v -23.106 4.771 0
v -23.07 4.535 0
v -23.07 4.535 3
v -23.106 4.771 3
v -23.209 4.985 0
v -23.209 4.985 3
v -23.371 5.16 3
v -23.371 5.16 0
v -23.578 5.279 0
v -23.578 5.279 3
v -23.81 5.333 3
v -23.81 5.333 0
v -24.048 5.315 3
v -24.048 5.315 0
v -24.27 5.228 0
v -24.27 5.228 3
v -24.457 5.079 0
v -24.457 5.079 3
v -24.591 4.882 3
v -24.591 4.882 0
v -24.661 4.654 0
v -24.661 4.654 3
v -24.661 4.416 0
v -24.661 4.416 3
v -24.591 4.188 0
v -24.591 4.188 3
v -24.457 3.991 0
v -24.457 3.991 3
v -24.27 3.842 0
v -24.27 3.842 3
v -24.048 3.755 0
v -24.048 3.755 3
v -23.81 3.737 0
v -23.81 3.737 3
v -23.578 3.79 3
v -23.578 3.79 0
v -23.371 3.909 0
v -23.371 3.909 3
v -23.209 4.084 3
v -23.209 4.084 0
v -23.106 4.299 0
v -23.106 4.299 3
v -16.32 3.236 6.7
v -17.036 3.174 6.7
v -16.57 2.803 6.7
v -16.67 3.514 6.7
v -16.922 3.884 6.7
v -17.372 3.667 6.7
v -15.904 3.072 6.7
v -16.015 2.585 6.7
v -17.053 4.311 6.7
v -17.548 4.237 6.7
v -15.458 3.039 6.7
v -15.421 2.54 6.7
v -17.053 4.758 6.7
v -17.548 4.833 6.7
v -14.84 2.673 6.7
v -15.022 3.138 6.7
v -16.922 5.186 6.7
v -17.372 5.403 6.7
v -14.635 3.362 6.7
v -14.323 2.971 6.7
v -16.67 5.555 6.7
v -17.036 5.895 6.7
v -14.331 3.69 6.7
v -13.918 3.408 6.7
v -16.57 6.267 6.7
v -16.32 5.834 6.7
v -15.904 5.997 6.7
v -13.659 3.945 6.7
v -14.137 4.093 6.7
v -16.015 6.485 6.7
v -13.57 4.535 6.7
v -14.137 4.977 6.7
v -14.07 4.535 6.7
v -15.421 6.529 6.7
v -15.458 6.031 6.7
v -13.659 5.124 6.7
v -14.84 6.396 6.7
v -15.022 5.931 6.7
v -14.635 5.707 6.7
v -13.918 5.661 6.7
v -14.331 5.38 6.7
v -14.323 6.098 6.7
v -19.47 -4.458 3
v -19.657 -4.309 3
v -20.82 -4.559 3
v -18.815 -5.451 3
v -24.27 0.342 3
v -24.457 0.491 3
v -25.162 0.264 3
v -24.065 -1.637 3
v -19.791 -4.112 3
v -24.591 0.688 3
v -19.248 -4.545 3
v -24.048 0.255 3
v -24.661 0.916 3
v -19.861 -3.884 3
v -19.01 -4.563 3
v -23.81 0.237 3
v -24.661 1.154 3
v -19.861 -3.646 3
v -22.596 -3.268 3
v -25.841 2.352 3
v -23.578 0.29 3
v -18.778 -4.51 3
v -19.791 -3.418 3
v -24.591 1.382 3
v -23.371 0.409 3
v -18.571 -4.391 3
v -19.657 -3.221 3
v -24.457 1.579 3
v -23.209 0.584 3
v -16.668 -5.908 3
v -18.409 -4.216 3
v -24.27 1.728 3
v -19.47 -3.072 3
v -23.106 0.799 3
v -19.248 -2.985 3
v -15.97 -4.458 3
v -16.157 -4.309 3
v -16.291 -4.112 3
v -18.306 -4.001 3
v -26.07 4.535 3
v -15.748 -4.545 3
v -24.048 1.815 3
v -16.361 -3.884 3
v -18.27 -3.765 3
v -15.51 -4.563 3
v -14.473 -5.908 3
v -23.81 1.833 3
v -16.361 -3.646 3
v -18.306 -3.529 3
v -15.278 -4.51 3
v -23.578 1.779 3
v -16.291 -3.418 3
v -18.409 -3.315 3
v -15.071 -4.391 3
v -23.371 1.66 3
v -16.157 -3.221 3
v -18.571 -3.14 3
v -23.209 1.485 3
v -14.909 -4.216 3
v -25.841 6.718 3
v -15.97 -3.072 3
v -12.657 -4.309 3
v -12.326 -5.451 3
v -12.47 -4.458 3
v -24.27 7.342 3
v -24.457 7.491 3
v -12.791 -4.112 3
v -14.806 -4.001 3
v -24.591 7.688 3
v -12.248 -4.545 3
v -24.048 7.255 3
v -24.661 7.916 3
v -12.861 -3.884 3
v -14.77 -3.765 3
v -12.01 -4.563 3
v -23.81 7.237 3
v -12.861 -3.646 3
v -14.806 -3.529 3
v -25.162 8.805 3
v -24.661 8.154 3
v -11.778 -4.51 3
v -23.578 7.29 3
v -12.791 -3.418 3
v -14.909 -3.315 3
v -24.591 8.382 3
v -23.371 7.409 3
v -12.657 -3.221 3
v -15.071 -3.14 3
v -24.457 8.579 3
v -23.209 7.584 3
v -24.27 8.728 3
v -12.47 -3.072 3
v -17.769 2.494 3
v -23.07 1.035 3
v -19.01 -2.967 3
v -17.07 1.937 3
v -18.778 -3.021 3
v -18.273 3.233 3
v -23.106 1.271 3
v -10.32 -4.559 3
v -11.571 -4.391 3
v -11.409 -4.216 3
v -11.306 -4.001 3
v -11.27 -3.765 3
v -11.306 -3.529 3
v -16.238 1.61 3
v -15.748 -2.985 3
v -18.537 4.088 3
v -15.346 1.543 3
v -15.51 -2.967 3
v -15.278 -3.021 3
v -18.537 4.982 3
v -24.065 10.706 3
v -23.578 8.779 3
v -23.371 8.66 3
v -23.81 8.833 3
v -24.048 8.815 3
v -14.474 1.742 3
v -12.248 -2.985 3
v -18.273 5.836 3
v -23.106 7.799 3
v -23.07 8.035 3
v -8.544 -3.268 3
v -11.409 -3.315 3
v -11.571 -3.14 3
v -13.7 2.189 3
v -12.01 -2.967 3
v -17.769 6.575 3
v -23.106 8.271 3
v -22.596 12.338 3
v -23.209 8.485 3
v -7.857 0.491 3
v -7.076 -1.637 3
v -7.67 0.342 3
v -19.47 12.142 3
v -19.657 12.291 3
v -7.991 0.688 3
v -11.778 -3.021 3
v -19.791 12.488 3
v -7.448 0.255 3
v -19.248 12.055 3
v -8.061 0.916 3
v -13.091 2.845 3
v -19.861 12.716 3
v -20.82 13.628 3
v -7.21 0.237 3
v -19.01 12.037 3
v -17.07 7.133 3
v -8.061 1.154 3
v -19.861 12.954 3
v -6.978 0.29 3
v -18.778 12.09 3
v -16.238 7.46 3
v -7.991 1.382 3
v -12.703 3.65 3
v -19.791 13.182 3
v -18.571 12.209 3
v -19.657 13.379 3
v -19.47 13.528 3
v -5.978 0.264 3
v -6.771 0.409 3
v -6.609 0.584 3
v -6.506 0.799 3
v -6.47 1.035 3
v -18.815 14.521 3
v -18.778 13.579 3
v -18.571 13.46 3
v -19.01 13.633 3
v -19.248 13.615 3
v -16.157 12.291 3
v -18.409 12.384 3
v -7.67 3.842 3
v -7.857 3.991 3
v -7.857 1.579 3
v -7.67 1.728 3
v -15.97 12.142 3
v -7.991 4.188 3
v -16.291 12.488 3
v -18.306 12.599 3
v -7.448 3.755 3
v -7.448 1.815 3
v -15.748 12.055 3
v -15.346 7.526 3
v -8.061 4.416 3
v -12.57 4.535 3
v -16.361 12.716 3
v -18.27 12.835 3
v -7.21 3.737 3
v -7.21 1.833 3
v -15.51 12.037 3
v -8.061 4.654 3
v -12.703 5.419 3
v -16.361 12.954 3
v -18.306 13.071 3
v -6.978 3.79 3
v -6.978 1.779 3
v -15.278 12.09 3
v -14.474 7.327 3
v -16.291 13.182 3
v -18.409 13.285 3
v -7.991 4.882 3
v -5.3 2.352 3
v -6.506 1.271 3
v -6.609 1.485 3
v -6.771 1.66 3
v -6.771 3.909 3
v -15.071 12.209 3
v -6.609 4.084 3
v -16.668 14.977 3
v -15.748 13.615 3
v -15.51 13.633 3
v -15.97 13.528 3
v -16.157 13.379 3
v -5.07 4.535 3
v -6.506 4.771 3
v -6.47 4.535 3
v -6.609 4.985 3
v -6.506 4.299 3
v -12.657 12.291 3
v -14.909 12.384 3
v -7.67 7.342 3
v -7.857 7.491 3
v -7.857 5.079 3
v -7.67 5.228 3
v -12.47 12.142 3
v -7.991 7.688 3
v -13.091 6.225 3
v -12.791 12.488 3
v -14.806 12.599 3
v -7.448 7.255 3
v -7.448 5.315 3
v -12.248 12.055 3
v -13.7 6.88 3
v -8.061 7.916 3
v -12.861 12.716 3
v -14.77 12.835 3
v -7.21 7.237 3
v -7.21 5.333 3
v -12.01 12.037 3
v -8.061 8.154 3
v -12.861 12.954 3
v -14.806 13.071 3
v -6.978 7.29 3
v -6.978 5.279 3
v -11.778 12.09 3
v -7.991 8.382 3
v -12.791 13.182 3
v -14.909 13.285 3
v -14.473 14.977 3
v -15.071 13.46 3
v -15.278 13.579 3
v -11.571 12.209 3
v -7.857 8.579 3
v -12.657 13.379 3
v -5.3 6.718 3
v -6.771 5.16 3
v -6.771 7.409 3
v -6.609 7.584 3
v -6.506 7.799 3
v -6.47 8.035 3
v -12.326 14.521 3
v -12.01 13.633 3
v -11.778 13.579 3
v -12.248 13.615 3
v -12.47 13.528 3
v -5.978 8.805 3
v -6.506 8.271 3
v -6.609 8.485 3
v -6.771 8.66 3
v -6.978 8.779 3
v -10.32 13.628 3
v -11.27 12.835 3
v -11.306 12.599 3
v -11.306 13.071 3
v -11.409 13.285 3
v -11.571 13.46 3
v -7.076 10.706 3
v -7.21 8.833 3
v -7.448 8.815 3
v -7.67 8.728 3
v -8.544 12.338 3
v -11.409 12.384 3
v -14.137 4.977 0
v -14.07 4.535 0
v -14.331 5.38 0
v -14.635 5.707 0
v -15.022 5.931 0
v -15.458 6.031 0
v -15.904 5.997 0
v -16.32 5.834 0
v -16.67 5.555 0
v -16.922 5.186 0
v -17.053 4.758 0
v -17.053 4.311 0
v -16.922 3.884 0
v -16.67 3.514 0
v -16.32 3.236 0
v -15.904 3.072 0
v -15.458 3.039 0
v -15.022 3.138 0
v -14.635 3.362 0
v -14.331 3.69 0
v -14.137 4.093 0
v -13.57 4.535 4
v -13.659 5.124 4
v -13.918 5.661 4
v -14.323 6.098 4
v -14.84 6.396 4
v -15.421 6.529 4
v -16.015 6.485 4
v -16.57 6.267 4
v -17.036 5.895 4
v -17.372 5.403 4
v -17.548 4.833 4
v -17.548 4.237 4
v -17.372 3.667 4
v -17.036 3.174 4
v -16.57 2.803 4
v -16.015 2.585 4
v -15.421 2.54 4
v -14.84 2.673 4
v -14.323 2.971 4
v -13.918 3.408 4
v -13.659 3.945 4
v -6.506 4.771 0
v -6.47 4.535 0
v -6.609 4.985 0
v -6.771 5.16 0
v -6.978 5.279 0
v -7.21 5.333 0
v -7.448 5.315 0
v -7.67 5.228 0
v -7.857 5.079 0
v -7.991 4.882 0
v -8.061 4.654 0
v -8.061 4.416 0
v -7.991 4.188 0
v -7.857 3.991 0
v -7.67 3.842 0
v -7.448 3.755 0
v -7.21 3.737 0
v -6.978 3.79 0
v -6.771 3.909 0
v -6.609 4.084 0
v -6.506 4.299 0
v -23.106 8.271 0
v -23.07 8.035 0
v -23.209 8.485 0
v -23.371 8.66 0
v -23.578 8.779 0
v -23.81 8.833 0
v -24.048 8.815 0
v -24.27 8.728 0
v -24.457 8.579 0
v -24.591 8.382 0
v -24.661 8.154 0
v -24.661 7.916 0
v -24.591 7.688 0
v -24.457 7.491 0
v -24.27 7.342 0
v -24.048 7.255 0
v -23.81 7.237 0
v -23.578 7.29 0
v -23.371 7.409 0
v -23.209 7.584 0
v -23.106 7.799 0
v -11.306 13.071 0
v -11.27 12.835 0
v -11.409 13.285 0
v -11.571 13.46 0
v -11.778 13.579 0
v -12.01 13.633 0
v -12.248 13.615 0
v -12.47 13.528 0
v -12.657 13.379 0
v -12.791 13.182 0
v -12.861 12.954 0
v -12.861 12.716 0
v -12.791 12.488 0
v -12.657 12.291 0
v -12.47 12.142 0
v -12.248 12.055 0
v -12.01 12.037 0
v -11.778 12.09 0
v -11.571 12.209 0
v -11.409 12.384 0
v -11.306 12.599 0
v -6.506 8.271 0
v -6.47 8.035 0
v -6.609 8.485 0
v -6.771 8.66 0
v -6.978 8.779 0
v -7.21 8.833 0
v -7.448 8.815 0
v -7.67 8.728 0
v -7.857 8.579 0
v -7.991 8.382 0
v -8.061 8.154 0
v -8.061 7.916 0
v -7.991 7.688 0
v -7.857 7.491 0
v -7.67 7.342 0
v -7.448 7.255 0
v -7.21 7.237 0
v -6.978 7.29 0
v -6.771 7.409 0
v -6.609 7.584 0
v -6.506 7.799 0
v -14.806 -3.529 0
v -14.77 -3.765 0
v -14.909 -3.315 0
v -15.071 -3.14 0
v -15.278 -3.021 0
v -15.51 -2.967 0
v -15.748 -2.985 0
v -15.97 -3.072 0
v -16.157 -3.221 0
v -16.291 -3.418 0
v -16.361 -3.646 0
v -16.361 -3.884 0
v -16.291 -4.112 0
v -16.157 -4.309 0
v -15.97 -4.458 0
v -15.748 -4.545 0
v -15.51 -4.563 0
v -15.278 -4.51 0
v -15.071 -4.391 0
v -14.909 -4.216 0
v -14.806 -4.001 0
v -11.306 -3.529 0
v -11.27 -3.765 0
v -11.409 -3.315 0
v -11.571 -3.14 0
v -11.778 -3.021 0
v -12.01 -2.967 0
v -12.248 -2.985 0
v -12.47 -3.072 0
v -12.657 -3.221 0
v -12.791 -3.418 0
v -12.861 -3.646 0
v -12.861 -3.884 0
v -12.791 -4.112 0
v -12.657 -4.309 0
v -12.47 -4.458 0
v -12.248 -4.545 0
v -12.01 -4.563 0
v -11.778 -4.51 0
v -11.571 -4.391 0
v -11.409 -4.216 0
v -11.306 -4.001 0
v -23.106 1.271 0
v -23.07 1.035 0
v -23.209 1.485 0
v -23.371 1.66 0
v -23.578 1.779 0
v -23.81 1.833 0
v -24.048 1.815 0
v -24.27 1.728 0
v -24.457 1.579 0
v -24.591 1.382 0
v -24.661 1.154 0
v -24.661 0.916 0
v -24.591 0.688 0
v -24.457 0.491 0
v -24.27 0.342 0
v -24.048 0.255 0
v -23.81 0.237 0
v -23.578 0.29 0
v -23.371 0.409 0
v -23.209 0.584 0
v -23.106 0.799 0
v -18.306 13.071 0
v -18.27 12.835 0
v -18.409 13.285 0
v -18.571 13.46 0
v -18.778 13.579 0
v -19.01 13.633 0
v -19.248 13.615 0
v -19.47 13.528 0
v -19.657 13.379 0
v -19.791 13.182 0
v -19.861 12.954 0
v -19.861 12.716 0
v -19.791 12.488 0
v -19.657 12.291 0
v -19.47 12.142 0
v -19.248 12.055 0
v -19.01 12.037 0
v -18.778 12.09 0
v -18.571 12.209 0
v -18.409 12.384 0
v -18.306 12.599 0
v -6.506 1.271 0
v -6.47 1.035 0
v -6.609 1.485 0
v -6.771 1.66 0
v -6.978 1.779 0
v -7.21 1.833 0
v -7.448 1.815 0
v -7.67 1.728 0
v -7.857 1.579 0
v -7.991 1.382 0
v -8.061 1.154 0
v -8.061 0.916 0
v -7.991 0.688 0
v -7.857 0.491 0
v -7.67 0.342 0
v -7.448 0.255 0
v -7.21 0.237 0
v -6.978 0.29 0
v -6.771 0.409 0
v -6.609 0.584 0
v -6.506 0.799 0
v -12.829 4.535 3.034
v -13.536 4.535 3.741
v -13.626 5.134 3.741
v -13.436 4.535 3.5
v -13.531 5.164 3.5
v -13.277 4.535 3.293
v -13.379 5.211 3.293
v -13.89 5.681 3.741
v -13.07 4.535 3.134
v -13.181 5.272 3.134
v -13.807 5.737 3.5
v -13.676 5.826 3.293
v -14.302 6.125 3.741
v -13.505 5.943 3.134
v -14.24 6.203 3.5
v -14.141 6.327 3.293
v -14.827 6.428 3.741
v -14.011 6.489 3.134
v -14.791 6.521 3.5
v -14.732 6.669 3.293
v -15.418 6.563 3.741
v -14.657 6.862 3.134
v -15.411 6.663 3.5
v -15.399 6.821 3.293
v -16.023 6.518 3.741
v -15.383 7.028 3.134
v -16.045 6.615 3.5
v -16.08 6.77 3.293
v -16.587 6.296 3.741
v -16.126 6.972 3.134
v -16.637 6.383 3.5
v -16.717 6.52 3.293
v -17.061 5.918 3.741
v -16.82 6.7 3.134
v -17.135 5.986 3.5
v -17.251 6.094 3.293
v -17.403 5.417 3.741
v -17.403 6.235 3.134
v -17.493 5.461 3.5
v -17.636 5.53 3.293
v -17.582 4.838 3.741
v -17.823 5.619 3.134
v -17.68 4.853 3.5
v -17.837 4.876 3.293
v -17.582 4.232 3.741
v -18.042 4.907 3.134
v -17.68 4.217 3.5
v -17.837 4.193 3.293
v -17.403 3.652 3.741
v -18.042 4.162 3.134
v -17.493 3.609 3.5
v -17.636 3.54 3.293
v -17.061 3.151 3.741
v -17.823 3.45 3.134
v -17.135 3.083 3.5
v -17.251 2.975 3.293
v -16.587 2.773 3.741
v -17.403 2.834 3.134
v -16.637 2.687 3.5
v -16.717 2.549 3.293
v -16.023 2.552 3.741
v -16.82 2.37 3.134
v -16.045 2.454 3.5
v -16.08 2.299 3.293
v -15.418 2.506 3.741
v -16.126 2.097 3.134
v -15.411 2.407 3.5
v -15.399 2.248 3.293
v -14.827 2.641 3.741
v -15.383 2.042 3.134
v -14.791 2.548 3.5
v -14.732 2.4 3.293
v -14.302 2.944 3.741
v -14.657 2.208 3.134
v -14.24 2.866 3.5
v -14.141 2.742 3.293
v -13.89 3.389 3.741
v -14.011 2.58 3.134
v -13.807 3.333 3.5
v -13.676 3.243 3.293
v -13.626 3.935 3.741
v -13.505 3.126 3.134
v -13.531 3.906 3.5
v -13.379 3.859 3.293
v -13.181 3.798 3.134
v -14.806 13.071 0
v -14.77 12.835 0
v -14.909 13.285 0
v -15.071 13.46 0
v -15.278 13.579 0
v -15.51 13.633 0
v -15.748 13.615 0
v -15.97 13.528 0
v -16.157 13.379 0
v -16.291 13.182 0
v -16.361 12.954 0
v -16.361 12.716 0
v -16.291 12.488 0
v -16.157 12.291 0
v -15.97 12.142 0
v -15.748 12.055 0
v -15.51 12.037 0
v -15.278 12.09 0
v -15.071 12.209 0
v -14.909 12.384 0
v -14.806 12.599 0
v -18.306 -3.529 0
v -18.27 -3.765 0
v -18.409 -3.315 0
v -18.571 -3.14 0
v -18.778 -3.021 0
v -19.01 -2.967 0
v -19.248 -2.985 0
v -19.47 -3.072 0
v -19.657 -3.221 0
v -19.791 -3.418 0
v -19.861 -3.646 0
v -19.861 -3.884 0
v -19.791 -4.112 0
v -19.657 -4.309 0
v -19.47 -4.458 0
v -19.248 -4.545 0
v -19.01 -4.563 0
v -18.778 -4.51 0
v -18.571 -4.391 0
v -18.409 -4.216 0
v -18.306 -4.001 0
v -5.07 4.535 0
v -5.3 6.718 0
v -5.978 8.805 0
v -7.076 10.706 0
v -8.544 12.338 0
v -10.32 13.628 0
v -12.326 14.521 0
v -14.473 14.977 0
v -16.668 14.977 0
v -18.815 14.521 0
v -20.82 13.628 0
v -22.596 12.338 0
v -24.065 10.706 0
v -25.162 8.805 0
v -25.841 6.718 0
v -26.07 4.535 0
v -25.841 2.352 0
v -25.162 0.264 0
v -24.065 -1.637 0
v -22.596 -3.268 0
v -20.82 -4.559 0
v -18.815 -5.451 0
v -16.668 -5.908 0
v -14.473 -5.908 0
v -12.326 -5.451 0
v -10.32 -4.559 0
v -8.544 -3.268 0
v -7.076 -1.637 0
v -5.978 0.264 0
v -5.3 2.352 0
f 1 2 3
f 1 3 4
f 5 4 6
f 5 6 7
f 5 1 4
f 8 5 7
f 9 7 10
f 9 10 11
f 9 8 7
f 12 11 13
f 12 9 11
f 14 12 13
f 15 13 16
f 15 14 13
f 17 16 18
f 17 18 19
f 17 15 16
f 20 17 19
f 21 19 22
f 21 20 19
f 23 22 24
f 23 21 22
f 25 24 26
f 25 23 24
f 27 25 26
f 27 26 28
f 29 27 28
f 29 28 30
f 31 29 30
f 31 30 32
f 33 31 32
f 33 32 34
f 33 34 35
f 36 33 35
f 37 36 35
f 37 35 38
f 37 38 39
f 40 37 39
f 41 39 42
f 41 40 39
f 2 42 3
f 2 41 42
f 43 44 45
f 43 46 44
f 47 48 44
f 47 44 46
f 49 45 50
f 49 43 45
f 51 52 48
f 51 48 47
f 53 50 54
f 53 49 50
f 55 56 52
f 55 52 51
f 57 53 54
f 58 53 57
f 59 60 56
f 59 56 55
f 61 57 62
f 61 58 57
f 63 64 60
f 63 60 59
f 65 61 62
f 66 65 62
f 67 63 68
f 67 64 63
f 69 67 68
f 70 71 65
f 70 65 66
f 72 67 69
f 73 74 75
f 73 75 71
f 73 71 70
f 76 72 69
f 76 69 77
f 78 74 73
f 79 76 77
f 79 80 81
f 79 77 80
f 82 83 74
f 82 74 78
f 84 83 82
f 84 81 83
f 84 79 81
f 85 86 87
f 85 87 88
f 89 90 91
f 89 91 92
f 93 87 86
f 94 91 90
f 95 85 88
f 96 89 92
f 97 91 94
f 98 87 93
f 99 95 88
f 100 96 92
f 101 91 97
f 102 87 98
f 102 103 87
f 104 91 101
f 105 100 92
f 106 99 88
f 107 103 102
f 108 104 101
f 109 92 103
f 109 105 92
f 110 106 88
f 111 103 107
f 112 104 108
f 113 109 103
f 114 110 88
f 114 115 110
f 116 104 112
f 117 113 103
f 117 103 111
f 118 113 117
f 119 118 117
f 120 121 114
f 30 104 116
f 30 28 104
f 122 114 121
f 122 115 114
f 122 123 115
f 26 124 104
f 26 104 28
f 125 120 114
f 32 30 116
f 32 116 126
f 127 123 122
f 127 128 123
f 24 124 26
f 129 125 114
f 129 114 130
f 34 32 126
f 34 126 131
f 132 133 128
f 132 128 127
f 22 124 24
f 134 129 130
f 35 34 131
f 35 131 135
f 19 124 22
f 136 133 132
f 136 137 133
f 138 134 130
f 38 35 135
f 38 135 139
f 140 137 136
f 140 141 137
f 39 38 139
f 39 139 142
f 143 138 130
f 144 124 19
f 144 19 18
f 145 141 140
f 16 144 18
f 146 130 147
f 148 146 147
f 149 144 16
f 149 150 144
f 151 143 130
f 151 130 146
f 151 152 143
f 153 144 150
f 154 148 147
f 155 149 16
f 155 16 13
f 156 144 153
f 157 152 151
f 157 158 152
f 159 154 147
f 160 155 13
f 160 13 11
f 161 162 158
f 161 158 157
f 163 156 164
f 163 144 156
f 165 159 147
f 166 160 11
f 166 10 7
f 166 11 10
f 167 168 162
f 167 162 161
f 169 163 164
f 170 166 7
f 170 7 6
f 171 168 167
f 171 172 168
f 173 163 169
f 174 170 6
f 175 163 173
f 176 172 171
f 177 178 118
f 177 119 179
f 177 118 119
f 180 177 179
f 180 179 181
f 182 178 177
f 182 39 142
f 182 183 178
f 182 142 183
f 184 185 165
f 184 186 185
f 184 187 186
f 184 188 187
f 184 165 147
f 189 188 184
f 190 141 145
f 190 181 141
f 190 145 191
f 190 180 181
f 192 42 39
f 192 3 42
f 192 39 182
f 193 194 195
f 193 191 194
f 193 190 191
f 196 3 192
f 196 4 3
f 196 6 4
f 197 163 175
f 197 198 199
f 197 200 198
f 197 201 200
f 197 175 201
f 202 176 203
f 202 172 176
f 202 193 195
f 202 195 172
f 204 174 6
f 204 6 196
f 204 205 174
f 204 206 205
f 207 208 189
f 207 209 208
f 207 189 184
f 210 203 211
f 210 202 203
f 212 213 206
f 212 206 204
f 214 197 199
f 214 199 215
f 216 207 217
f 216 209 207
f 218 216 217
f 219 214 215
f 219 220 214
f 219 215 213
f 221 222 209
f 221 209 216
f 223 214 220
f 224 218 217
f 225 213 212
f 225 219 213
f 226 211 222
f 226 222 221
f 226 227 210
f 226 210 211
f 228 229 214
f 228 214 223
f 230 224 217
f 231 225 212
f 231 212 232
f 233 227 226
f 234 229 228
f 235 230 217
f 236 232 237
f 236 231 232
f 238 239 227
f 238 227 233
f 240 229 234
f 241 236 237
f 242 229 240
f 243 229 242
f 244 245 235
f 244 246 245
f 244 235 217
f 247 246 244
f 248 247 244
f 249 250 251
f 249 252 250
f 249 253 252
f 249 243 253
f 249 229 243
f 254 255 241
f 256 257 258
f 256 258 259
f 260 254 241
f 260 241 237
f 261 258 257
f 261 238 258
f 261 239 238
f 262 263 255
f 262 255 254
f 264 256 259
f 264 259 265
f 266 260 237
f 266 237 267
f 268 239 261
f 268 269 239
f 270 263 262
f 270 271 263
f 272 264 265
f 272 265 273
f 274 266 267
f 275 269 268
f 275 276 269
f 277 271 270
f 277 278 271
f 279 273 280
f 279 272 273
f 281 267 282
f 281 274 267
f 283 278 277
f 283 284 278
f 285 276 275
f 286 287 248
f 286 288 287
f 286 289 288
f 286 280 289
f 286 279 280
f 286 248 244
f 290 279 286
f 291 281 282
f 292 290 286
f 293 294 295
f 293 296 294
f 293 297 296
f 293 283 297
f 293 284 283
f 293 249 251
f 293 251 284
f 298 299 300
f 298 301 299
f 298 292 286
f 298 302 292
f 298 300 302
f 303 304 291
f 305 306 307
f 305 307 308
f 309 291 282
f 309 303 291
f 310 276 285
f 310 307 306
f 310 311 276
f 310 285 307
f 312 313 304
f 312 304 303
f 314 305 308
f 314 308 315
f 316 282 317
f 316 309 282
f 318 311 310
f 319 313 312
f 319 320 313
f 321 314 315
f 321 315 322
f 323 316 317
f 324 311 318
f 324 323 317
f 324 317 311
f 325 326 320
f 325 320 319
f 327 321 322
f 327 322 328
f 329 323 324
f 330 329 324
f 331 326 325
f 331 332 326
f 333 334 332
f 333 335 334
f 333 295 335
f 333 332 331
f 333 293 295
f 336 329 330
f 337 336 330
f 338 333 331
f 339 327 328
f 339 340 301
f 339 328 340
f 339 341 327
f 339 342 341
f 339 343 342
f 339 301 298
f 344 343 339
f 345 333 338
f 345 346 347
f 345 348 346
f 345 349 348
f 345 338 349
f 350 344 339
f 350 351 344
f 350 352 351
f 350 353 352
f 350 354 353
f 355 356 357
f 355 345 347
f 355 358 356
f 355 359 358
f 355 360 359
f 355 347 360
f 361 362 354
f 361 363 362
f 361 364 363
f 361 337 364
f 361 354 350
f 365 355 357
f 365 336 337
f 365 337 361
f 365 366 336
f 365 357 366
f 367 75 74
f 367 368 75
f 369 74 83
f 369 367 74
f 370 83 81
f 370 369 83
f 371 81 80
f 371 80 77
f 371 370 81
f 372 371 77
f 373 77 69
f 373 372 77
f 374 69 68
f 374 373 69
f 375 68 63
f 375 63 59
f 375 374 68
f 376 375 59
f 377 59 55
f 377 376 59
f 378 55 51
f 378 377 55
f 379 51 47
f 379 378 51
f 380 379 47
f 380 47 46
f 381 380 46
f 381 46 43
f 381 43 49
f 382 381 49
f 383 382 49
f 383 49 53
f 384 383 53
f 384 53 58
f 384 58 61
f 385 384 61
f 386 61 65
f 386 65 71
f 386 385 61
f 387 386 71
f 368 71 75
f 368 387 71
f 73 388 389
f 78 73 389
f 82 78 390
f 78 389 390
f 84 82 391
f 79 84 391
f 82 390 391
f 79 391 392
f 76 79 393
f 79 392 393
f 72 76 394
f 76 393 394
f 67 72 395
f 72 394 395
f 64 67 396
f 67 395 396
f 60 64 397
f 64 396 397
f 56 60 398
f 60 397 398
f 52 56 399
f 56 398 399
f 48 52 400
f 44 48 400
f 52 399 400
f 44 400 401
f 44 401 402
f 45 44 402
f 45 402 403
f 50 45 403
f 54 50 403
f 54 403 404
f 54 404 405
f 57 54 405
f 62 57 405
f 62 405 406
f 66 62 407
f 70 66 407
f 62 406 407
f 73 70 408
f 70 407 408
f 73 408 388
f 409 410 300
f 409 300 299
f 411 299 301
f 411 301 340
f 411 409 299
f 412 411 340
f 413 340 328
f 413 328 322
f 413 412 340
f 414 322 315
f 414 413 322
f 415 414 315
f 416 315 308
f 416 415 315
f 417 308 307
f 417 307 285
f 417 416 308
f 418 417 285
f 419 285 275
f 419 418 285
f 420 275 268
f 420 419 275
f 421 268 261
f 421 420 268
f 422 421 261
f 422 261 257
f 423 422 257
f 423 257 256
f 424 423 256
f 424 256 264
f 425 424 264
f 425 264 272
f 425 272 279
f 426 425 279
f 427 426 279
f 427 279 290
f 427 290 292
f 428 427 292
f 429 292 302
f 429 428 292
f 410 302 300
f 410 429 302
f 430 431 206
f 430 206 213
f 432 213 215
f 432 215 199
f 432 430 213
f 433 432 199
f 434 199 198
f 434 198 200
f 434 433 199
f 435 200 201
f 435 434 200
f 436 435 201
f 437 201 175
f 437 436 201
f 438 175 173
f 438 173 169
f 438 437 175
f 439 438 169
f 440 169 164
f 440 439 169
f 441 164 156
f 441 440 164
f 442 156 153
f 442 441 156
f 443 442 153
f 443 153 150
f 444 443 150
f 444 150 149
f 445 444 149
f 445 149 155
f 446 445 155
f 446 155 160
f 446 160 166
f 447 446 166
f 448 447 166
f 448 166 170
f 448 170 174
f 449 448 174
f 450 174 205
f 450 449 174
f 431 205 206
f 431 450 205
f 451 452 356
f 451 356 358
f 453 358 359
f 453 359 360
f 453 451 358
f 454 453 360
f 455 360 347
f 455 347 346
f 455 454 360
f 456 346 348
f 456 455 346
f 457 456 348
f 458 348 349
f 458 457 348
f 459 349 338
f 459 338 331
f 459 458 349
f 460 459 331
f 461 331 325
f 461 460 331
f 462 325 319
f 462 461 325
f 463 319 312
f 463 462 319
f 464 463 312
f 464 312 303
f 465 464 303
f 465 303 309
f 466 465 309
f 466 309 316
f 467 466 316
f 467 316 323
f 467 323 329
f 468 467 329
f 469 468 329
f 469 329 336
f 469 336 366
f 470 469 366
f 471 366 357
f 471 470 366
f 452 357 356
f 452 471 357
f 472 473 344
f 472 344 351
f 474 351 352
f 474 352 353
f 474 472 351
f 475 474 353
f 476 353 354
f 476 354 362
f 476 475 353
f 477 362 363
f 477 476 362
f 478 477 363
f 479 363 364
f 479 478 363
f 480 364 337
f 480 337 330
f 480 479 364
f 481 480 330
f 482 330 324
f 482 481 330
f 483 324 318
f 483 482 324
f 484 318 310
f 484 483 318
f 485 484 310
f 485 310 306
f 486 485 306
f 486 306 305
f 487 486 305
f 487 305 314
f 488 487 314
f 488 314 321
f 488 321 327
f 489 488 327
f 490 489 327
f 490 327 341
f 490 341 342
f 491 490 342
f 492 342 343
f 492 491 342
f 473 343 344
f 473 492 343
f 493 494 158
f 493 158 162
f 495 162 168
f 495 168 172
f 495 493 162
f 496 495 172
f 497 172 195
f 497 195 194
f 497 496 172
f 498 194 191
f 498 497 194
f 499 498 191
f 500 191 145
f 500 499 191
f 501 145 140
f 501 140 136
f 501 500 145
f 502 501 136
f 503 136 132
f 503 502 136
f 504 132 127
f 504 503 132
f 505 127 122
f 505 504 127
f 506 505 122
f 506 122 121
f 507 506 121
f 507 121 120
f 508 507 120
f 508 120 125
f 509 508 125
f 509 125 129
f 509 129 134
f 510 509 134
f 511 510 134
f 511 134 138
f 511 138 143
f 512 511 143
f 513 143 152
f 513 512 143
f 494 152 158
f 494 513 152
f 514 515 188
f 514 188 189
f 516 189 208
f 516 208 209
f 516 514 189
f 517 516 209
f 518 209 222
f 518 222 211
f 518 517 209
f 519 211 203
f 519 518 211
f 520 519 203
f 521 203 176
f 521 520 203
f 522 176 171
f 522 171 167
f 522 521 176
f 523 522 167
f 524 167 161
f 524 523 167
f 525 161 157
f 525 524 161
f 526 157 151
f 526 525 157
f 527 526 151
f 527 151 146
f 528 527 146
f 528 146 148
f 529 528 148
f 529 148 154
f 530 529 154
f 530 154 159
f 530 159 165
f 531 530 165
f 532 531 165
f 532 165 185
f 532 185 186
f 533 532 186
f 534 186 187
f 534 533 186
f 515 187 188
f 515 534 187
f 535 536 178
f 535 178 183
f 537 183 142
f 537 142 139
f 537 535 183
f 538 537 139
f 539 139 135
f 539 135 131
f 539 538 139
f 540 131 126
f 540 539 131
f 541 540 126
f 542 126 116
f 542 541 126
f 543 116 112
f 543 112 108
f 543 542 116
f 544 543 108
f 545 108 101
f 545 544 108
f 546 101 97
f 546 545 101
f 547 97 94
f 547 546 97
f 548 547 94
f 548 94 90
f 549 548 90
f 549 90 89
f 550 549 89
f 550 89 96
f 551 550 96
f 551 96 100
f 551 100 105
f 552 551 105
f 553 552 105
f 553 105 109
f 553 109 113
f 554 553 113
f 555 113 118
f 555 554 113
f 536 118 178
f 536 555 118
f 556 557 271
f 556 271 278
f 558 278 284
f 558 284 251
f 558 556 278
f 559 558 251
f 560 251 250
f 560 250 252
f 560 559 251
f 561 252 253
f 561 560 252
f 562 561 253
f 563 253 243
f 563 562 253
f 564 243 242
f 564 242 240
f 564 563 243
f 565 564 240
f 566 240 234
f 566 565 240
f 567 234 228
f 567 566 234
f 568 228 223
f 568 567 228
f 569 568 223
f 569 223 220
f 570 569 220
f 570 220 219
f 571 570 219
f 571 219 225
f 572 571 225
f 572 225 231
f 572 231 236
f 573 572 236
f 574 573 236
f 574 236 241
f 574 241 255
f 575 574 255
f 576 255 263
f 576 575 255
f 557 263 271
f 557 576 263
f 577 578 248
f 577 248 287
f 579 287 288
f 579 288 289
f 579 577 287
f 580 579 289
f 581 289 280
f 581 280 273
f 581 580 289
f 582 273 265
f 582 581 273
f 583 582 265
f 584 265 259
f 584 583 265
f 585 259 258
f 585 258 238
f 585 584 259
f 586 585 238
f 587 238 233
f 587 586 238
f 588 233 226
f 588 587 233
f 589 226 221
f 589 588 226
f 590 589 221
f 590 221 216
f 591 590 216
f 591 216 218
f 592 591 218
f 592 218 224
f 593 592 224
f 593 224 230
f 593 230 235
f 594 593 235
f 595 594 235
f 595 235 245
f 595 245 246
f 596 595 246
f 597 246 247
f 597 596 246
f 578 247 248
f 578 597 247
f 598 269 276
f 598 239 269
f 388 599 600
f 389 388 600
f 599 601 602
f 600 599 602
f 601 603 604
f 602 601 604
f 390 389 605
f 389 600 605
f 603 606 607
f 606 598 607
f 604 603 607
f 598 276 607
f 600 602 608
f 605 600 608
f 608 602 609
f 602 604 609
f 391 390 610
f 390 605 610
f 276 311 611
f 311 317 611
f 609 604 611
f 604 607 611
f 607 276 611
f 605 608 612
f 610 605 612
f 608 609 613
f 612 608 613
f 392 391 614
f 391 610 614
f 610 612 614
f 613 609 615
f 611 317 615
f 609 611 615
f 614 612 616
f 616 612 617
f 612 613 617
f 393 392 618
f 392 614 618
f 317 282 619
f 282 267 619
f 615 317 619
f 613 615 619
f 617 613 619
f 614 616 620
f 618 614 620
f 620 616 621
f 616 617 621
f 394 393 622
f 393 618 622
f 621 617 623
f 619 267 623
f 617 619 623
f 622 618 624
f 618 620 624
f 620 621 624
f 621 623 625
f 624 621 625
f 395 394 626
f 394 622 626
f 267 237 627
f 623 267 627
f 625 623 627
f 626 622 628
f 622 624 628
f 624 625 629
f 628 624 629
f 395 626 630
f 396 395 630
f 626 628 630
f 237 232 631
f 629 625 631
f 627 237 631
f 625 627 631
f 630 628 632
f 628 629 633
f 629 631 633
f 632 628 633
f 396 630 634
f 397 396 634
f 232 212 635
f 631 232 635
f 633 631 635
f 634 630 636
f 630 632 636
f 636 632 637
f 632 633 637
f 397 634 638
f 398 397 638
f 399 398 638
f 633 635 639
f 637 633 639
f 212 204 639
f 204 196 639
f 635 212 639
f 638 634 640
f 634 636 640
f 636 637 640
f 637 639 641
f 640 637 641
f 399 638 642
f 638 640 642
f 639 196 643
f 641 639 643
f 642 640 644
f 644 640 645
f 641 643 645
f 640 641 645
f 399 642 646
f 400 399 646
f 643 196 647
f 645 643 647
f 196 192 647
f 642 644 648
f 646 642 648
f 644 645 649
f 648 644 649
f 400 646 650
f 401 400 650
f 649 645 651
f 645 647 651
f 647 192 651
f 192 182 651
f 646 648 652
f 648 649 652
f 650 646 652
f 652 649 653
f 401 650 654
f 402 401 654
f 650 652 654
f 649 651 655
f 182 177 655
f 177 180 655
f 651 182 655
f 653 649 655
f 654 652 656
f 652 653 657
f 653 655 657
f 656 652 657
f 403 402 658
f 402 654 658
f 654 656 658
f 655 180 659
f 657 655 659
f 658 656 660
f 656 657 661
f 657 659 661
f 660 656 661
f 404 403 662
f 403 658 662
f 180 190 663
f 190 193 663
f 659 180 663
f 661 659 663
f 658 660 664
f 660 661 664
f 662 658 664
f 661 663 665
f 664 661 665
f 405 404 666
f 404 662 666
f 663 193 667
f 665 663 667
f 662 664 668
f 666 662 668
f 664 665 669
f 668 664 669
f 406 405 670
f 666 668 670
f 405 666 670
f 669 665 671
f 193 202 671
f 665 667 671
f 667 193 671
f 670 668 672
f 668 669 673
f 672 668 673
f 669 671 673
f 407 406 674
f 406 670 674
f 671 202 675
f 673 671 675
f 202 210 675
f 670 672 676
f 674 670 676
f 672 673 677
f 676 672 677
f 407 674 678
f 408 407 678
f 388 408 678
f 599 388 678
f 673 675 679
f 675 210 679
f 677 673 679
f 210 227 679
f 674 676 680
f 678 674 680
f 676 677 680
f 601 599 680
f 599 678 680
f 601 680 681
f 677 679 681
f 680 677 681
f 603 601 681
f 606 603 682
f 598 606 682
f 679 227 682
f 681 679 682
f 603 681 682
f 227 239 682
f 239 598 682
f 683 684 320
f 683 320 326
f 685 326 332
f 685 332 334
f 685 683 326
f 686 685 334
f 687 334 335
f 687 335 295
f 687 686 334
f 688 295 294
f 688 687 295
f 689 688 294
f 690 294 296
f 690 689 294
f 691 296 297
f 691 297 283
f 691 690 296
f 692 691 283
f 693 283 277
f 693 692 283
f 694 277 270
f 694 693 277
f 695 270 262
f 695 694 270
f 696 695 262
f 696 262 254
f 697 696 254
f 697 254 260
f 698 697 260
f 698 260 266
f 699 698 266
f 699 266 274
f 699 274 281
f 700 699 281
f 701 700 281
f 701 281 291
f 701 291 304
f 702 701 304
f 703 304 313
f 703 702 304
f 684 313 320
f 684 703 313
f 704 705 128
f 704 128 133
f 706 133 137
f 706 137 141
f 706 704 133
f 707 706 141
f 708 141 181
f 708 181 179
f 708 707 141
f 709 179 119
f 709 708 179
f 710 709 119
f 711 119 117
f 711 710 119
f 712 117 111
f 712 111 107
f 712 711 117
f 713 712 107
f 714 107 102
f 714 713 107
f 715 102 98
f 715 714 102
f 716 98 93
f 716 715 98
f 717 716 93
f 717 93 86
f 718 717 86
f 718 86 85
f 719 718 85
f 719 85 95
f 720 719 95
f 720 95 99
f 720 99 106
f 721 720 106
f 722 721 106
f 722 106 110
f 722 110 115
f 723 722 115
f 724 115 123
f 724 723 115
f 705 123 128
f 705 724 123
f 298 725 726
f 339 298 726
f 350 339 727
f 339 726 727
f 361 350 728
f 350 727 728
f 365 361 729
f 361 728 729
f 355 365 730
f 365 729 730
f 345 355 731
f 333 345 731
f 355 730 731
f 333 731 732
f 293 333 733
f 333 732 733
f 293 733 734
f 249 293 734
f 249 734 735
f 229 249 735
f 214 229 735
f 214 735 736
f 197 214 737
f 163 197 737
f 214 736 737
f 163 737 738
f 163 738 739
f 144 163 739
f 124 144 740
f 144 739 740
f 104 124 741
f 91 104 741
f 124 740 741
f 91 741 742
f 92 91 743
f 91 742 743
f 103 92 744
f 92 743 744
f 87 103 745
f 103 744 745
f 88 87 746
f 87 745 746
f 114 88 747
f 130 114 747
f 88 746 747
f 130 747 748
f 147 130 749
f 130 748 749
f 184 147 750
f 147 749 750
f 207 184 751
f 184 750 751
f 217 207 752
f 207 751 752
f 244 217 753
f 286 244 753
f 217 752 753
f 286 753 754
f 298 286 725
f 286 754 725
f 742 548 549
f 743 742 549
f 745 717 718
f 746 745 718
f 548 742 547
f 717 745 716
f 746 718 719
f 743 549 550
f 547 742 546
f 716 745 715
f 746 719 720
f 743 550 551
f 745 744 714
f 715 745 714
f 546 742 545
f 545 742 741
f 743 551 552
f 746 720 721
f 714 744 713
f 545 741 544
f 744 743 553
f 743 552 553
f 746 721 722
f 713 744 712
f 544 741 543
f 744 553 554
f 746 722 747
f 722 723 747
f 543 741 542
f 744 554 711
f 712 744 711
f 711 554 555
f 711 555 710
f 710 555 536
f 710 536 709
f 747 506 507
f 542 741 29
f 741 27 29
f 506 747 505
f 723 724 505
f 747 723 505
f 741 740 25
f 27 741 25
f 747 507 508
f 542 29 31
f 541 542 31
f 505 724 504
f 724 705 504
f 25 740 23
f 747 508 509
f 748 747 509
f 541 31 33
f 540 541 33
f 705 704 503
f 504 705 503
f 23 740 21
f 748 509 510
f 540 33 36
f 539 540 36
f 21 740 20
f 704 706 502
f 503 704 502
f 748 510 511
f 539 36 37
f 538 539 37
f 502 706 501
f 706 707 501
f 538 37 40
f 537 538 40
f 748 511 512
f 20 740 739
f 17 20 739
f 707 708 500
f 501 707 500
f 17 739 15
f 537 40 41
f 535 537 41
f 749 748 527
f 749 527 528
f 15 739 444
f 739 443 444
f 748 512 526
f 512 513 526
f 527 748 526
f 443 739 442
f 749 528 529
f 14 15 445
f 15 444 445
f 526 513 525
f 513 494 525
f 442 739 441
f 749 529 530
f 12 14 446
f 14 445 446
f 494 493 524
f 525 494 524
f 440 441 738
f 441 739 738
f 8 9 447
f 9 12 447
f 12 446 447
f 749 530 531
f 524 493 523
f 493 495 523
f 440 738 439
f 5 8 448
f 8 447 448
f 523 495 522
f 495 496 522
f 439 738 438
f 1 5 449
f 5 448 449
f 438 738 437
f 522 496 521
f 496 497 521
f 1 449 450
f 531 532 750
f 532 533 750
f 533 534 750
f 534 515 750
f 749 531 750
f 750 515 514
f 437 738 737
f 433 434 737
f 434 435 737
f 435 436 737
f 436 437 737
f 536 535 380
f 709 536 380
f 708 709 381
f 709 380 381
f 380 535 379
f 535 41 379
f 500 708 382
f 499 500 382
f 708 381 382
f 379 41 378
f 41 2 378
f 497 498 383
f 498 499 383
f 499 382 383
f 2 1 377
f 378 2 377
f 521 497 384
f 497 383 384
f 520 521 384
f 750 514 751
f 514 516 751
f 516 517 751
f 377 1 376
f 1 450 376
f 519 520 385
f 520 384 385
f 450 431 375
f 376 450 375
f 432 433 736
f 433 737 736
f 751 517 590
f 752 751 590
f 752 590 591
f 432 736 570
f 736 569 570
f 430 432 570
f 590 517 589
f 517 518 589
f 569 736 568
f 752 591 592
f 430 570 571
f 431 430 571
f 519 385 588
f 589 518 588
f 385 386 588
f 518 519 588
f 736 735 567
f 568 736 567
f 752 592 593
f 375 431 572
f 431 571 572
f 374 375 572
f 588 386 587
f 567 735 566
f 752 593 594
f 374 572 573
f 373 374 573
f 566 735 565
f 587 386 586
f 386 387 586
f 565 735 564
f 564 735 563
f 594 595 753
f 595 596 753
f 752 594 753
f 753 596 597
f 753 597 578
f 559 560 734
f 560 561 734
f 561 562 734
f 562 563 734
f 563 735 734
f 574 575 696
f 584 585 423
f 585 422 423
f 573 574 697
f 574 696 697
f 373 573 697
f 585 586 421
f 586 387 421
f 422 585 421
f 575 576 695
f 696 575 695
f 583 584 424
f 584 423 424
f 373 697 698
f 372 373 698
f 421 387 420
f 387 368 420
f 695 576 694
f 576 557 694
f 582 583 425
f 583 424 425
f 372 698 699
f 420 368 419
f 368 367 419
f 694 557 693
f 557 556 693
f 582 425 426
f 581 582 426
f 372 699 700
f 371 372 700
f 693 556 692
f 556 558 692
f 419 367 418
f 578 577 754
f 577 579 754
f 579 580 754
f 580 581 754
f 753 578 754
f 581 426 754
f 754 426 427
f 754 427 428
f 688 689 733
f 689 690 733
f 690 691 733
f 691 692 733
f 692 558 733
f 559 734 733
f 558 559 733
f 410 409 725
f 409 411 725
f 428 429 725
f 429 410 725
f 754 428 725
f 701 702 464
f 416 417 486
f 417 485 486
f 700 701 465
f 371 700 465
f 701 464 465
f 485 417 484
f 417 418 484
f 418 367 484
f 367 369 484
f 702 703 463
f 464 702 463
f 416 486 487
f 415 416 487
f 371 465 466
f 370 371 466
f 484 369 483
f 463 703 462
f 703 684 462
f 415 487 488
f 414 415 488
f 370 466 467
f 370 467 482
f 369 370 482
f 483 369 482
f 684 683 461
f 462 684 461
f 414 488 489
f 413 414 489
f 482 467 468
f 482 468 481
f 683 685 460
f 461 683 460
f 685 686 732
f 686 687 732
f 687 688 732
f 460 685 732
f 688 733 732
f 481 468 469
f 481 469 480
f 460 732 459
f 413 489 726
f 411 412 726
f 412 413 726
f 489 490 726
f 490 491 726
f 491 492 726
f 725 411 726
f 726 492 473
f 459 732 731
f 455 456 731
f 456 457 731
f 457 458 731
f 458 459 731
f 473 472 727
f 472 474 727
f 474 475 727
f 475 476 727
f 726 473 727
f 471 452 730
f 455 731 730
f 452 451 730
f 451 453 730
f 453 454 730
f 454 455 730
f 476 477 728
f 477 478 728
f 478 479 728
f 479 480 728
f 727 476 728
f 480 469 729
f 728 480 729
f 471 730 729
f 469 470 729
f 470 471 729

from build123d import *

# Parameters (mm, degrees)
ESQUISSE1_R        = 10.5
ESQUISSE1_R_2      = 0.8
ESQUISSE1_R_3      = 1.5
BOSS_EXTRU_1_DEPTH = 3
ESQUISSE3_R        = 2
ESQUISSE3_R_2      = 1.5
BOSS_EXTRU_2_DEPTH = 3.7
CONG_1_R           = 1


with BuildPart() as part:
    # Esquisse1 → Boss.-Extru.1 (new body)
    with BuildSketch(Plane.XY):
        with Locations((-15.570186162, 4.534749907)):
            Circle(ESQUISSE1_R)
        with Locations((-12.070186162, 12.834749907)):
            Circle(ESQUISSE1_R_2, mode=Mode.SUBTRACT)
        with Locations((-15.570186162, 4.534749907)):
            Circle(ESQUISSE1_R_3, mode=Mode.SUBTRACT)
        with Locations((-7.270186162, 4.534749907)):
            Circle(ESQUISSE1_R_2, mode=Mode.SUBTRACT)
        with Locations((-15.570186162, 12.834749907)):
            Circle(ESQUISSE1_R_2, mode=Mode.SUBTRACT)
        with Locations((-23.870186162, 4.534749907)):
            Circle(ESQUISSE1_R_2, mode=Mode.SUBTRACT)
        with Locations((-15.570186162, -3.765250093)):
            Circle(ESQUISSE1_R_2, mode=Mode.SUBTRACT)
        with Locations((-19.070186162, 12.834749907)):
            Circle(ESQUISSE1_R_2, mode=Mode.SUBTRACT)
        with Locations((-19.070186162, -3.765250093)):
            Circle(ESQUISSE1_R_2, mode=Mode.SUBTRACT)
        with Locations((-12.070186162, -3.765250093)):
            Circle(ESQUISSE1_R_2, mode=Mode.SUBTRACT)
        with Locations((-7.270186162, 8.034749907)):
            Circle(ESQUISSE1_R_2, mode=Mode.SUBTRACT)
        with Locations((-7.270186162, 1.034749907)):
            Circle(ESQUISSE1_R_2, mode=Mode.SUBTRACT)
        with Locations((-23.870186162, 1.034749907)):
            Circle(ESQUISSE1_R_2, mode=Mode.SUBTRACT)
        with Locations((-23.870186162, 8.034749907)):
            Circle(ESQUISSE1_R_2, mode=Mode.SUBTRACT)
    extrude(amount=BOSS_EXTRU_1_DEPTH)

    # Esquisse3 → Boss.-Extru.2 (add)
    with BuildSketch(Plane.XY.offset(3)):
        with Locations((-15.570186162, 4.534749907)):
            Circle(ESQUISSE3_R)
        with Locations((-15.570186162, 4.534749907)):
            Circle(ESQUISSE3_R_2, mode=Mode.SUBTRACT)
    extrude(amount=BOSS_EXTRU_2_DEPTH)

    # Congé1
    cong_1_edges = [part.edges().sort_by_distance(p)[0] for p in [
        (-17.570186162, 4.534749907, 3),
    ]]
    fillet(cong_1_edges, radius=CONG_1_R)


solid = part.part
